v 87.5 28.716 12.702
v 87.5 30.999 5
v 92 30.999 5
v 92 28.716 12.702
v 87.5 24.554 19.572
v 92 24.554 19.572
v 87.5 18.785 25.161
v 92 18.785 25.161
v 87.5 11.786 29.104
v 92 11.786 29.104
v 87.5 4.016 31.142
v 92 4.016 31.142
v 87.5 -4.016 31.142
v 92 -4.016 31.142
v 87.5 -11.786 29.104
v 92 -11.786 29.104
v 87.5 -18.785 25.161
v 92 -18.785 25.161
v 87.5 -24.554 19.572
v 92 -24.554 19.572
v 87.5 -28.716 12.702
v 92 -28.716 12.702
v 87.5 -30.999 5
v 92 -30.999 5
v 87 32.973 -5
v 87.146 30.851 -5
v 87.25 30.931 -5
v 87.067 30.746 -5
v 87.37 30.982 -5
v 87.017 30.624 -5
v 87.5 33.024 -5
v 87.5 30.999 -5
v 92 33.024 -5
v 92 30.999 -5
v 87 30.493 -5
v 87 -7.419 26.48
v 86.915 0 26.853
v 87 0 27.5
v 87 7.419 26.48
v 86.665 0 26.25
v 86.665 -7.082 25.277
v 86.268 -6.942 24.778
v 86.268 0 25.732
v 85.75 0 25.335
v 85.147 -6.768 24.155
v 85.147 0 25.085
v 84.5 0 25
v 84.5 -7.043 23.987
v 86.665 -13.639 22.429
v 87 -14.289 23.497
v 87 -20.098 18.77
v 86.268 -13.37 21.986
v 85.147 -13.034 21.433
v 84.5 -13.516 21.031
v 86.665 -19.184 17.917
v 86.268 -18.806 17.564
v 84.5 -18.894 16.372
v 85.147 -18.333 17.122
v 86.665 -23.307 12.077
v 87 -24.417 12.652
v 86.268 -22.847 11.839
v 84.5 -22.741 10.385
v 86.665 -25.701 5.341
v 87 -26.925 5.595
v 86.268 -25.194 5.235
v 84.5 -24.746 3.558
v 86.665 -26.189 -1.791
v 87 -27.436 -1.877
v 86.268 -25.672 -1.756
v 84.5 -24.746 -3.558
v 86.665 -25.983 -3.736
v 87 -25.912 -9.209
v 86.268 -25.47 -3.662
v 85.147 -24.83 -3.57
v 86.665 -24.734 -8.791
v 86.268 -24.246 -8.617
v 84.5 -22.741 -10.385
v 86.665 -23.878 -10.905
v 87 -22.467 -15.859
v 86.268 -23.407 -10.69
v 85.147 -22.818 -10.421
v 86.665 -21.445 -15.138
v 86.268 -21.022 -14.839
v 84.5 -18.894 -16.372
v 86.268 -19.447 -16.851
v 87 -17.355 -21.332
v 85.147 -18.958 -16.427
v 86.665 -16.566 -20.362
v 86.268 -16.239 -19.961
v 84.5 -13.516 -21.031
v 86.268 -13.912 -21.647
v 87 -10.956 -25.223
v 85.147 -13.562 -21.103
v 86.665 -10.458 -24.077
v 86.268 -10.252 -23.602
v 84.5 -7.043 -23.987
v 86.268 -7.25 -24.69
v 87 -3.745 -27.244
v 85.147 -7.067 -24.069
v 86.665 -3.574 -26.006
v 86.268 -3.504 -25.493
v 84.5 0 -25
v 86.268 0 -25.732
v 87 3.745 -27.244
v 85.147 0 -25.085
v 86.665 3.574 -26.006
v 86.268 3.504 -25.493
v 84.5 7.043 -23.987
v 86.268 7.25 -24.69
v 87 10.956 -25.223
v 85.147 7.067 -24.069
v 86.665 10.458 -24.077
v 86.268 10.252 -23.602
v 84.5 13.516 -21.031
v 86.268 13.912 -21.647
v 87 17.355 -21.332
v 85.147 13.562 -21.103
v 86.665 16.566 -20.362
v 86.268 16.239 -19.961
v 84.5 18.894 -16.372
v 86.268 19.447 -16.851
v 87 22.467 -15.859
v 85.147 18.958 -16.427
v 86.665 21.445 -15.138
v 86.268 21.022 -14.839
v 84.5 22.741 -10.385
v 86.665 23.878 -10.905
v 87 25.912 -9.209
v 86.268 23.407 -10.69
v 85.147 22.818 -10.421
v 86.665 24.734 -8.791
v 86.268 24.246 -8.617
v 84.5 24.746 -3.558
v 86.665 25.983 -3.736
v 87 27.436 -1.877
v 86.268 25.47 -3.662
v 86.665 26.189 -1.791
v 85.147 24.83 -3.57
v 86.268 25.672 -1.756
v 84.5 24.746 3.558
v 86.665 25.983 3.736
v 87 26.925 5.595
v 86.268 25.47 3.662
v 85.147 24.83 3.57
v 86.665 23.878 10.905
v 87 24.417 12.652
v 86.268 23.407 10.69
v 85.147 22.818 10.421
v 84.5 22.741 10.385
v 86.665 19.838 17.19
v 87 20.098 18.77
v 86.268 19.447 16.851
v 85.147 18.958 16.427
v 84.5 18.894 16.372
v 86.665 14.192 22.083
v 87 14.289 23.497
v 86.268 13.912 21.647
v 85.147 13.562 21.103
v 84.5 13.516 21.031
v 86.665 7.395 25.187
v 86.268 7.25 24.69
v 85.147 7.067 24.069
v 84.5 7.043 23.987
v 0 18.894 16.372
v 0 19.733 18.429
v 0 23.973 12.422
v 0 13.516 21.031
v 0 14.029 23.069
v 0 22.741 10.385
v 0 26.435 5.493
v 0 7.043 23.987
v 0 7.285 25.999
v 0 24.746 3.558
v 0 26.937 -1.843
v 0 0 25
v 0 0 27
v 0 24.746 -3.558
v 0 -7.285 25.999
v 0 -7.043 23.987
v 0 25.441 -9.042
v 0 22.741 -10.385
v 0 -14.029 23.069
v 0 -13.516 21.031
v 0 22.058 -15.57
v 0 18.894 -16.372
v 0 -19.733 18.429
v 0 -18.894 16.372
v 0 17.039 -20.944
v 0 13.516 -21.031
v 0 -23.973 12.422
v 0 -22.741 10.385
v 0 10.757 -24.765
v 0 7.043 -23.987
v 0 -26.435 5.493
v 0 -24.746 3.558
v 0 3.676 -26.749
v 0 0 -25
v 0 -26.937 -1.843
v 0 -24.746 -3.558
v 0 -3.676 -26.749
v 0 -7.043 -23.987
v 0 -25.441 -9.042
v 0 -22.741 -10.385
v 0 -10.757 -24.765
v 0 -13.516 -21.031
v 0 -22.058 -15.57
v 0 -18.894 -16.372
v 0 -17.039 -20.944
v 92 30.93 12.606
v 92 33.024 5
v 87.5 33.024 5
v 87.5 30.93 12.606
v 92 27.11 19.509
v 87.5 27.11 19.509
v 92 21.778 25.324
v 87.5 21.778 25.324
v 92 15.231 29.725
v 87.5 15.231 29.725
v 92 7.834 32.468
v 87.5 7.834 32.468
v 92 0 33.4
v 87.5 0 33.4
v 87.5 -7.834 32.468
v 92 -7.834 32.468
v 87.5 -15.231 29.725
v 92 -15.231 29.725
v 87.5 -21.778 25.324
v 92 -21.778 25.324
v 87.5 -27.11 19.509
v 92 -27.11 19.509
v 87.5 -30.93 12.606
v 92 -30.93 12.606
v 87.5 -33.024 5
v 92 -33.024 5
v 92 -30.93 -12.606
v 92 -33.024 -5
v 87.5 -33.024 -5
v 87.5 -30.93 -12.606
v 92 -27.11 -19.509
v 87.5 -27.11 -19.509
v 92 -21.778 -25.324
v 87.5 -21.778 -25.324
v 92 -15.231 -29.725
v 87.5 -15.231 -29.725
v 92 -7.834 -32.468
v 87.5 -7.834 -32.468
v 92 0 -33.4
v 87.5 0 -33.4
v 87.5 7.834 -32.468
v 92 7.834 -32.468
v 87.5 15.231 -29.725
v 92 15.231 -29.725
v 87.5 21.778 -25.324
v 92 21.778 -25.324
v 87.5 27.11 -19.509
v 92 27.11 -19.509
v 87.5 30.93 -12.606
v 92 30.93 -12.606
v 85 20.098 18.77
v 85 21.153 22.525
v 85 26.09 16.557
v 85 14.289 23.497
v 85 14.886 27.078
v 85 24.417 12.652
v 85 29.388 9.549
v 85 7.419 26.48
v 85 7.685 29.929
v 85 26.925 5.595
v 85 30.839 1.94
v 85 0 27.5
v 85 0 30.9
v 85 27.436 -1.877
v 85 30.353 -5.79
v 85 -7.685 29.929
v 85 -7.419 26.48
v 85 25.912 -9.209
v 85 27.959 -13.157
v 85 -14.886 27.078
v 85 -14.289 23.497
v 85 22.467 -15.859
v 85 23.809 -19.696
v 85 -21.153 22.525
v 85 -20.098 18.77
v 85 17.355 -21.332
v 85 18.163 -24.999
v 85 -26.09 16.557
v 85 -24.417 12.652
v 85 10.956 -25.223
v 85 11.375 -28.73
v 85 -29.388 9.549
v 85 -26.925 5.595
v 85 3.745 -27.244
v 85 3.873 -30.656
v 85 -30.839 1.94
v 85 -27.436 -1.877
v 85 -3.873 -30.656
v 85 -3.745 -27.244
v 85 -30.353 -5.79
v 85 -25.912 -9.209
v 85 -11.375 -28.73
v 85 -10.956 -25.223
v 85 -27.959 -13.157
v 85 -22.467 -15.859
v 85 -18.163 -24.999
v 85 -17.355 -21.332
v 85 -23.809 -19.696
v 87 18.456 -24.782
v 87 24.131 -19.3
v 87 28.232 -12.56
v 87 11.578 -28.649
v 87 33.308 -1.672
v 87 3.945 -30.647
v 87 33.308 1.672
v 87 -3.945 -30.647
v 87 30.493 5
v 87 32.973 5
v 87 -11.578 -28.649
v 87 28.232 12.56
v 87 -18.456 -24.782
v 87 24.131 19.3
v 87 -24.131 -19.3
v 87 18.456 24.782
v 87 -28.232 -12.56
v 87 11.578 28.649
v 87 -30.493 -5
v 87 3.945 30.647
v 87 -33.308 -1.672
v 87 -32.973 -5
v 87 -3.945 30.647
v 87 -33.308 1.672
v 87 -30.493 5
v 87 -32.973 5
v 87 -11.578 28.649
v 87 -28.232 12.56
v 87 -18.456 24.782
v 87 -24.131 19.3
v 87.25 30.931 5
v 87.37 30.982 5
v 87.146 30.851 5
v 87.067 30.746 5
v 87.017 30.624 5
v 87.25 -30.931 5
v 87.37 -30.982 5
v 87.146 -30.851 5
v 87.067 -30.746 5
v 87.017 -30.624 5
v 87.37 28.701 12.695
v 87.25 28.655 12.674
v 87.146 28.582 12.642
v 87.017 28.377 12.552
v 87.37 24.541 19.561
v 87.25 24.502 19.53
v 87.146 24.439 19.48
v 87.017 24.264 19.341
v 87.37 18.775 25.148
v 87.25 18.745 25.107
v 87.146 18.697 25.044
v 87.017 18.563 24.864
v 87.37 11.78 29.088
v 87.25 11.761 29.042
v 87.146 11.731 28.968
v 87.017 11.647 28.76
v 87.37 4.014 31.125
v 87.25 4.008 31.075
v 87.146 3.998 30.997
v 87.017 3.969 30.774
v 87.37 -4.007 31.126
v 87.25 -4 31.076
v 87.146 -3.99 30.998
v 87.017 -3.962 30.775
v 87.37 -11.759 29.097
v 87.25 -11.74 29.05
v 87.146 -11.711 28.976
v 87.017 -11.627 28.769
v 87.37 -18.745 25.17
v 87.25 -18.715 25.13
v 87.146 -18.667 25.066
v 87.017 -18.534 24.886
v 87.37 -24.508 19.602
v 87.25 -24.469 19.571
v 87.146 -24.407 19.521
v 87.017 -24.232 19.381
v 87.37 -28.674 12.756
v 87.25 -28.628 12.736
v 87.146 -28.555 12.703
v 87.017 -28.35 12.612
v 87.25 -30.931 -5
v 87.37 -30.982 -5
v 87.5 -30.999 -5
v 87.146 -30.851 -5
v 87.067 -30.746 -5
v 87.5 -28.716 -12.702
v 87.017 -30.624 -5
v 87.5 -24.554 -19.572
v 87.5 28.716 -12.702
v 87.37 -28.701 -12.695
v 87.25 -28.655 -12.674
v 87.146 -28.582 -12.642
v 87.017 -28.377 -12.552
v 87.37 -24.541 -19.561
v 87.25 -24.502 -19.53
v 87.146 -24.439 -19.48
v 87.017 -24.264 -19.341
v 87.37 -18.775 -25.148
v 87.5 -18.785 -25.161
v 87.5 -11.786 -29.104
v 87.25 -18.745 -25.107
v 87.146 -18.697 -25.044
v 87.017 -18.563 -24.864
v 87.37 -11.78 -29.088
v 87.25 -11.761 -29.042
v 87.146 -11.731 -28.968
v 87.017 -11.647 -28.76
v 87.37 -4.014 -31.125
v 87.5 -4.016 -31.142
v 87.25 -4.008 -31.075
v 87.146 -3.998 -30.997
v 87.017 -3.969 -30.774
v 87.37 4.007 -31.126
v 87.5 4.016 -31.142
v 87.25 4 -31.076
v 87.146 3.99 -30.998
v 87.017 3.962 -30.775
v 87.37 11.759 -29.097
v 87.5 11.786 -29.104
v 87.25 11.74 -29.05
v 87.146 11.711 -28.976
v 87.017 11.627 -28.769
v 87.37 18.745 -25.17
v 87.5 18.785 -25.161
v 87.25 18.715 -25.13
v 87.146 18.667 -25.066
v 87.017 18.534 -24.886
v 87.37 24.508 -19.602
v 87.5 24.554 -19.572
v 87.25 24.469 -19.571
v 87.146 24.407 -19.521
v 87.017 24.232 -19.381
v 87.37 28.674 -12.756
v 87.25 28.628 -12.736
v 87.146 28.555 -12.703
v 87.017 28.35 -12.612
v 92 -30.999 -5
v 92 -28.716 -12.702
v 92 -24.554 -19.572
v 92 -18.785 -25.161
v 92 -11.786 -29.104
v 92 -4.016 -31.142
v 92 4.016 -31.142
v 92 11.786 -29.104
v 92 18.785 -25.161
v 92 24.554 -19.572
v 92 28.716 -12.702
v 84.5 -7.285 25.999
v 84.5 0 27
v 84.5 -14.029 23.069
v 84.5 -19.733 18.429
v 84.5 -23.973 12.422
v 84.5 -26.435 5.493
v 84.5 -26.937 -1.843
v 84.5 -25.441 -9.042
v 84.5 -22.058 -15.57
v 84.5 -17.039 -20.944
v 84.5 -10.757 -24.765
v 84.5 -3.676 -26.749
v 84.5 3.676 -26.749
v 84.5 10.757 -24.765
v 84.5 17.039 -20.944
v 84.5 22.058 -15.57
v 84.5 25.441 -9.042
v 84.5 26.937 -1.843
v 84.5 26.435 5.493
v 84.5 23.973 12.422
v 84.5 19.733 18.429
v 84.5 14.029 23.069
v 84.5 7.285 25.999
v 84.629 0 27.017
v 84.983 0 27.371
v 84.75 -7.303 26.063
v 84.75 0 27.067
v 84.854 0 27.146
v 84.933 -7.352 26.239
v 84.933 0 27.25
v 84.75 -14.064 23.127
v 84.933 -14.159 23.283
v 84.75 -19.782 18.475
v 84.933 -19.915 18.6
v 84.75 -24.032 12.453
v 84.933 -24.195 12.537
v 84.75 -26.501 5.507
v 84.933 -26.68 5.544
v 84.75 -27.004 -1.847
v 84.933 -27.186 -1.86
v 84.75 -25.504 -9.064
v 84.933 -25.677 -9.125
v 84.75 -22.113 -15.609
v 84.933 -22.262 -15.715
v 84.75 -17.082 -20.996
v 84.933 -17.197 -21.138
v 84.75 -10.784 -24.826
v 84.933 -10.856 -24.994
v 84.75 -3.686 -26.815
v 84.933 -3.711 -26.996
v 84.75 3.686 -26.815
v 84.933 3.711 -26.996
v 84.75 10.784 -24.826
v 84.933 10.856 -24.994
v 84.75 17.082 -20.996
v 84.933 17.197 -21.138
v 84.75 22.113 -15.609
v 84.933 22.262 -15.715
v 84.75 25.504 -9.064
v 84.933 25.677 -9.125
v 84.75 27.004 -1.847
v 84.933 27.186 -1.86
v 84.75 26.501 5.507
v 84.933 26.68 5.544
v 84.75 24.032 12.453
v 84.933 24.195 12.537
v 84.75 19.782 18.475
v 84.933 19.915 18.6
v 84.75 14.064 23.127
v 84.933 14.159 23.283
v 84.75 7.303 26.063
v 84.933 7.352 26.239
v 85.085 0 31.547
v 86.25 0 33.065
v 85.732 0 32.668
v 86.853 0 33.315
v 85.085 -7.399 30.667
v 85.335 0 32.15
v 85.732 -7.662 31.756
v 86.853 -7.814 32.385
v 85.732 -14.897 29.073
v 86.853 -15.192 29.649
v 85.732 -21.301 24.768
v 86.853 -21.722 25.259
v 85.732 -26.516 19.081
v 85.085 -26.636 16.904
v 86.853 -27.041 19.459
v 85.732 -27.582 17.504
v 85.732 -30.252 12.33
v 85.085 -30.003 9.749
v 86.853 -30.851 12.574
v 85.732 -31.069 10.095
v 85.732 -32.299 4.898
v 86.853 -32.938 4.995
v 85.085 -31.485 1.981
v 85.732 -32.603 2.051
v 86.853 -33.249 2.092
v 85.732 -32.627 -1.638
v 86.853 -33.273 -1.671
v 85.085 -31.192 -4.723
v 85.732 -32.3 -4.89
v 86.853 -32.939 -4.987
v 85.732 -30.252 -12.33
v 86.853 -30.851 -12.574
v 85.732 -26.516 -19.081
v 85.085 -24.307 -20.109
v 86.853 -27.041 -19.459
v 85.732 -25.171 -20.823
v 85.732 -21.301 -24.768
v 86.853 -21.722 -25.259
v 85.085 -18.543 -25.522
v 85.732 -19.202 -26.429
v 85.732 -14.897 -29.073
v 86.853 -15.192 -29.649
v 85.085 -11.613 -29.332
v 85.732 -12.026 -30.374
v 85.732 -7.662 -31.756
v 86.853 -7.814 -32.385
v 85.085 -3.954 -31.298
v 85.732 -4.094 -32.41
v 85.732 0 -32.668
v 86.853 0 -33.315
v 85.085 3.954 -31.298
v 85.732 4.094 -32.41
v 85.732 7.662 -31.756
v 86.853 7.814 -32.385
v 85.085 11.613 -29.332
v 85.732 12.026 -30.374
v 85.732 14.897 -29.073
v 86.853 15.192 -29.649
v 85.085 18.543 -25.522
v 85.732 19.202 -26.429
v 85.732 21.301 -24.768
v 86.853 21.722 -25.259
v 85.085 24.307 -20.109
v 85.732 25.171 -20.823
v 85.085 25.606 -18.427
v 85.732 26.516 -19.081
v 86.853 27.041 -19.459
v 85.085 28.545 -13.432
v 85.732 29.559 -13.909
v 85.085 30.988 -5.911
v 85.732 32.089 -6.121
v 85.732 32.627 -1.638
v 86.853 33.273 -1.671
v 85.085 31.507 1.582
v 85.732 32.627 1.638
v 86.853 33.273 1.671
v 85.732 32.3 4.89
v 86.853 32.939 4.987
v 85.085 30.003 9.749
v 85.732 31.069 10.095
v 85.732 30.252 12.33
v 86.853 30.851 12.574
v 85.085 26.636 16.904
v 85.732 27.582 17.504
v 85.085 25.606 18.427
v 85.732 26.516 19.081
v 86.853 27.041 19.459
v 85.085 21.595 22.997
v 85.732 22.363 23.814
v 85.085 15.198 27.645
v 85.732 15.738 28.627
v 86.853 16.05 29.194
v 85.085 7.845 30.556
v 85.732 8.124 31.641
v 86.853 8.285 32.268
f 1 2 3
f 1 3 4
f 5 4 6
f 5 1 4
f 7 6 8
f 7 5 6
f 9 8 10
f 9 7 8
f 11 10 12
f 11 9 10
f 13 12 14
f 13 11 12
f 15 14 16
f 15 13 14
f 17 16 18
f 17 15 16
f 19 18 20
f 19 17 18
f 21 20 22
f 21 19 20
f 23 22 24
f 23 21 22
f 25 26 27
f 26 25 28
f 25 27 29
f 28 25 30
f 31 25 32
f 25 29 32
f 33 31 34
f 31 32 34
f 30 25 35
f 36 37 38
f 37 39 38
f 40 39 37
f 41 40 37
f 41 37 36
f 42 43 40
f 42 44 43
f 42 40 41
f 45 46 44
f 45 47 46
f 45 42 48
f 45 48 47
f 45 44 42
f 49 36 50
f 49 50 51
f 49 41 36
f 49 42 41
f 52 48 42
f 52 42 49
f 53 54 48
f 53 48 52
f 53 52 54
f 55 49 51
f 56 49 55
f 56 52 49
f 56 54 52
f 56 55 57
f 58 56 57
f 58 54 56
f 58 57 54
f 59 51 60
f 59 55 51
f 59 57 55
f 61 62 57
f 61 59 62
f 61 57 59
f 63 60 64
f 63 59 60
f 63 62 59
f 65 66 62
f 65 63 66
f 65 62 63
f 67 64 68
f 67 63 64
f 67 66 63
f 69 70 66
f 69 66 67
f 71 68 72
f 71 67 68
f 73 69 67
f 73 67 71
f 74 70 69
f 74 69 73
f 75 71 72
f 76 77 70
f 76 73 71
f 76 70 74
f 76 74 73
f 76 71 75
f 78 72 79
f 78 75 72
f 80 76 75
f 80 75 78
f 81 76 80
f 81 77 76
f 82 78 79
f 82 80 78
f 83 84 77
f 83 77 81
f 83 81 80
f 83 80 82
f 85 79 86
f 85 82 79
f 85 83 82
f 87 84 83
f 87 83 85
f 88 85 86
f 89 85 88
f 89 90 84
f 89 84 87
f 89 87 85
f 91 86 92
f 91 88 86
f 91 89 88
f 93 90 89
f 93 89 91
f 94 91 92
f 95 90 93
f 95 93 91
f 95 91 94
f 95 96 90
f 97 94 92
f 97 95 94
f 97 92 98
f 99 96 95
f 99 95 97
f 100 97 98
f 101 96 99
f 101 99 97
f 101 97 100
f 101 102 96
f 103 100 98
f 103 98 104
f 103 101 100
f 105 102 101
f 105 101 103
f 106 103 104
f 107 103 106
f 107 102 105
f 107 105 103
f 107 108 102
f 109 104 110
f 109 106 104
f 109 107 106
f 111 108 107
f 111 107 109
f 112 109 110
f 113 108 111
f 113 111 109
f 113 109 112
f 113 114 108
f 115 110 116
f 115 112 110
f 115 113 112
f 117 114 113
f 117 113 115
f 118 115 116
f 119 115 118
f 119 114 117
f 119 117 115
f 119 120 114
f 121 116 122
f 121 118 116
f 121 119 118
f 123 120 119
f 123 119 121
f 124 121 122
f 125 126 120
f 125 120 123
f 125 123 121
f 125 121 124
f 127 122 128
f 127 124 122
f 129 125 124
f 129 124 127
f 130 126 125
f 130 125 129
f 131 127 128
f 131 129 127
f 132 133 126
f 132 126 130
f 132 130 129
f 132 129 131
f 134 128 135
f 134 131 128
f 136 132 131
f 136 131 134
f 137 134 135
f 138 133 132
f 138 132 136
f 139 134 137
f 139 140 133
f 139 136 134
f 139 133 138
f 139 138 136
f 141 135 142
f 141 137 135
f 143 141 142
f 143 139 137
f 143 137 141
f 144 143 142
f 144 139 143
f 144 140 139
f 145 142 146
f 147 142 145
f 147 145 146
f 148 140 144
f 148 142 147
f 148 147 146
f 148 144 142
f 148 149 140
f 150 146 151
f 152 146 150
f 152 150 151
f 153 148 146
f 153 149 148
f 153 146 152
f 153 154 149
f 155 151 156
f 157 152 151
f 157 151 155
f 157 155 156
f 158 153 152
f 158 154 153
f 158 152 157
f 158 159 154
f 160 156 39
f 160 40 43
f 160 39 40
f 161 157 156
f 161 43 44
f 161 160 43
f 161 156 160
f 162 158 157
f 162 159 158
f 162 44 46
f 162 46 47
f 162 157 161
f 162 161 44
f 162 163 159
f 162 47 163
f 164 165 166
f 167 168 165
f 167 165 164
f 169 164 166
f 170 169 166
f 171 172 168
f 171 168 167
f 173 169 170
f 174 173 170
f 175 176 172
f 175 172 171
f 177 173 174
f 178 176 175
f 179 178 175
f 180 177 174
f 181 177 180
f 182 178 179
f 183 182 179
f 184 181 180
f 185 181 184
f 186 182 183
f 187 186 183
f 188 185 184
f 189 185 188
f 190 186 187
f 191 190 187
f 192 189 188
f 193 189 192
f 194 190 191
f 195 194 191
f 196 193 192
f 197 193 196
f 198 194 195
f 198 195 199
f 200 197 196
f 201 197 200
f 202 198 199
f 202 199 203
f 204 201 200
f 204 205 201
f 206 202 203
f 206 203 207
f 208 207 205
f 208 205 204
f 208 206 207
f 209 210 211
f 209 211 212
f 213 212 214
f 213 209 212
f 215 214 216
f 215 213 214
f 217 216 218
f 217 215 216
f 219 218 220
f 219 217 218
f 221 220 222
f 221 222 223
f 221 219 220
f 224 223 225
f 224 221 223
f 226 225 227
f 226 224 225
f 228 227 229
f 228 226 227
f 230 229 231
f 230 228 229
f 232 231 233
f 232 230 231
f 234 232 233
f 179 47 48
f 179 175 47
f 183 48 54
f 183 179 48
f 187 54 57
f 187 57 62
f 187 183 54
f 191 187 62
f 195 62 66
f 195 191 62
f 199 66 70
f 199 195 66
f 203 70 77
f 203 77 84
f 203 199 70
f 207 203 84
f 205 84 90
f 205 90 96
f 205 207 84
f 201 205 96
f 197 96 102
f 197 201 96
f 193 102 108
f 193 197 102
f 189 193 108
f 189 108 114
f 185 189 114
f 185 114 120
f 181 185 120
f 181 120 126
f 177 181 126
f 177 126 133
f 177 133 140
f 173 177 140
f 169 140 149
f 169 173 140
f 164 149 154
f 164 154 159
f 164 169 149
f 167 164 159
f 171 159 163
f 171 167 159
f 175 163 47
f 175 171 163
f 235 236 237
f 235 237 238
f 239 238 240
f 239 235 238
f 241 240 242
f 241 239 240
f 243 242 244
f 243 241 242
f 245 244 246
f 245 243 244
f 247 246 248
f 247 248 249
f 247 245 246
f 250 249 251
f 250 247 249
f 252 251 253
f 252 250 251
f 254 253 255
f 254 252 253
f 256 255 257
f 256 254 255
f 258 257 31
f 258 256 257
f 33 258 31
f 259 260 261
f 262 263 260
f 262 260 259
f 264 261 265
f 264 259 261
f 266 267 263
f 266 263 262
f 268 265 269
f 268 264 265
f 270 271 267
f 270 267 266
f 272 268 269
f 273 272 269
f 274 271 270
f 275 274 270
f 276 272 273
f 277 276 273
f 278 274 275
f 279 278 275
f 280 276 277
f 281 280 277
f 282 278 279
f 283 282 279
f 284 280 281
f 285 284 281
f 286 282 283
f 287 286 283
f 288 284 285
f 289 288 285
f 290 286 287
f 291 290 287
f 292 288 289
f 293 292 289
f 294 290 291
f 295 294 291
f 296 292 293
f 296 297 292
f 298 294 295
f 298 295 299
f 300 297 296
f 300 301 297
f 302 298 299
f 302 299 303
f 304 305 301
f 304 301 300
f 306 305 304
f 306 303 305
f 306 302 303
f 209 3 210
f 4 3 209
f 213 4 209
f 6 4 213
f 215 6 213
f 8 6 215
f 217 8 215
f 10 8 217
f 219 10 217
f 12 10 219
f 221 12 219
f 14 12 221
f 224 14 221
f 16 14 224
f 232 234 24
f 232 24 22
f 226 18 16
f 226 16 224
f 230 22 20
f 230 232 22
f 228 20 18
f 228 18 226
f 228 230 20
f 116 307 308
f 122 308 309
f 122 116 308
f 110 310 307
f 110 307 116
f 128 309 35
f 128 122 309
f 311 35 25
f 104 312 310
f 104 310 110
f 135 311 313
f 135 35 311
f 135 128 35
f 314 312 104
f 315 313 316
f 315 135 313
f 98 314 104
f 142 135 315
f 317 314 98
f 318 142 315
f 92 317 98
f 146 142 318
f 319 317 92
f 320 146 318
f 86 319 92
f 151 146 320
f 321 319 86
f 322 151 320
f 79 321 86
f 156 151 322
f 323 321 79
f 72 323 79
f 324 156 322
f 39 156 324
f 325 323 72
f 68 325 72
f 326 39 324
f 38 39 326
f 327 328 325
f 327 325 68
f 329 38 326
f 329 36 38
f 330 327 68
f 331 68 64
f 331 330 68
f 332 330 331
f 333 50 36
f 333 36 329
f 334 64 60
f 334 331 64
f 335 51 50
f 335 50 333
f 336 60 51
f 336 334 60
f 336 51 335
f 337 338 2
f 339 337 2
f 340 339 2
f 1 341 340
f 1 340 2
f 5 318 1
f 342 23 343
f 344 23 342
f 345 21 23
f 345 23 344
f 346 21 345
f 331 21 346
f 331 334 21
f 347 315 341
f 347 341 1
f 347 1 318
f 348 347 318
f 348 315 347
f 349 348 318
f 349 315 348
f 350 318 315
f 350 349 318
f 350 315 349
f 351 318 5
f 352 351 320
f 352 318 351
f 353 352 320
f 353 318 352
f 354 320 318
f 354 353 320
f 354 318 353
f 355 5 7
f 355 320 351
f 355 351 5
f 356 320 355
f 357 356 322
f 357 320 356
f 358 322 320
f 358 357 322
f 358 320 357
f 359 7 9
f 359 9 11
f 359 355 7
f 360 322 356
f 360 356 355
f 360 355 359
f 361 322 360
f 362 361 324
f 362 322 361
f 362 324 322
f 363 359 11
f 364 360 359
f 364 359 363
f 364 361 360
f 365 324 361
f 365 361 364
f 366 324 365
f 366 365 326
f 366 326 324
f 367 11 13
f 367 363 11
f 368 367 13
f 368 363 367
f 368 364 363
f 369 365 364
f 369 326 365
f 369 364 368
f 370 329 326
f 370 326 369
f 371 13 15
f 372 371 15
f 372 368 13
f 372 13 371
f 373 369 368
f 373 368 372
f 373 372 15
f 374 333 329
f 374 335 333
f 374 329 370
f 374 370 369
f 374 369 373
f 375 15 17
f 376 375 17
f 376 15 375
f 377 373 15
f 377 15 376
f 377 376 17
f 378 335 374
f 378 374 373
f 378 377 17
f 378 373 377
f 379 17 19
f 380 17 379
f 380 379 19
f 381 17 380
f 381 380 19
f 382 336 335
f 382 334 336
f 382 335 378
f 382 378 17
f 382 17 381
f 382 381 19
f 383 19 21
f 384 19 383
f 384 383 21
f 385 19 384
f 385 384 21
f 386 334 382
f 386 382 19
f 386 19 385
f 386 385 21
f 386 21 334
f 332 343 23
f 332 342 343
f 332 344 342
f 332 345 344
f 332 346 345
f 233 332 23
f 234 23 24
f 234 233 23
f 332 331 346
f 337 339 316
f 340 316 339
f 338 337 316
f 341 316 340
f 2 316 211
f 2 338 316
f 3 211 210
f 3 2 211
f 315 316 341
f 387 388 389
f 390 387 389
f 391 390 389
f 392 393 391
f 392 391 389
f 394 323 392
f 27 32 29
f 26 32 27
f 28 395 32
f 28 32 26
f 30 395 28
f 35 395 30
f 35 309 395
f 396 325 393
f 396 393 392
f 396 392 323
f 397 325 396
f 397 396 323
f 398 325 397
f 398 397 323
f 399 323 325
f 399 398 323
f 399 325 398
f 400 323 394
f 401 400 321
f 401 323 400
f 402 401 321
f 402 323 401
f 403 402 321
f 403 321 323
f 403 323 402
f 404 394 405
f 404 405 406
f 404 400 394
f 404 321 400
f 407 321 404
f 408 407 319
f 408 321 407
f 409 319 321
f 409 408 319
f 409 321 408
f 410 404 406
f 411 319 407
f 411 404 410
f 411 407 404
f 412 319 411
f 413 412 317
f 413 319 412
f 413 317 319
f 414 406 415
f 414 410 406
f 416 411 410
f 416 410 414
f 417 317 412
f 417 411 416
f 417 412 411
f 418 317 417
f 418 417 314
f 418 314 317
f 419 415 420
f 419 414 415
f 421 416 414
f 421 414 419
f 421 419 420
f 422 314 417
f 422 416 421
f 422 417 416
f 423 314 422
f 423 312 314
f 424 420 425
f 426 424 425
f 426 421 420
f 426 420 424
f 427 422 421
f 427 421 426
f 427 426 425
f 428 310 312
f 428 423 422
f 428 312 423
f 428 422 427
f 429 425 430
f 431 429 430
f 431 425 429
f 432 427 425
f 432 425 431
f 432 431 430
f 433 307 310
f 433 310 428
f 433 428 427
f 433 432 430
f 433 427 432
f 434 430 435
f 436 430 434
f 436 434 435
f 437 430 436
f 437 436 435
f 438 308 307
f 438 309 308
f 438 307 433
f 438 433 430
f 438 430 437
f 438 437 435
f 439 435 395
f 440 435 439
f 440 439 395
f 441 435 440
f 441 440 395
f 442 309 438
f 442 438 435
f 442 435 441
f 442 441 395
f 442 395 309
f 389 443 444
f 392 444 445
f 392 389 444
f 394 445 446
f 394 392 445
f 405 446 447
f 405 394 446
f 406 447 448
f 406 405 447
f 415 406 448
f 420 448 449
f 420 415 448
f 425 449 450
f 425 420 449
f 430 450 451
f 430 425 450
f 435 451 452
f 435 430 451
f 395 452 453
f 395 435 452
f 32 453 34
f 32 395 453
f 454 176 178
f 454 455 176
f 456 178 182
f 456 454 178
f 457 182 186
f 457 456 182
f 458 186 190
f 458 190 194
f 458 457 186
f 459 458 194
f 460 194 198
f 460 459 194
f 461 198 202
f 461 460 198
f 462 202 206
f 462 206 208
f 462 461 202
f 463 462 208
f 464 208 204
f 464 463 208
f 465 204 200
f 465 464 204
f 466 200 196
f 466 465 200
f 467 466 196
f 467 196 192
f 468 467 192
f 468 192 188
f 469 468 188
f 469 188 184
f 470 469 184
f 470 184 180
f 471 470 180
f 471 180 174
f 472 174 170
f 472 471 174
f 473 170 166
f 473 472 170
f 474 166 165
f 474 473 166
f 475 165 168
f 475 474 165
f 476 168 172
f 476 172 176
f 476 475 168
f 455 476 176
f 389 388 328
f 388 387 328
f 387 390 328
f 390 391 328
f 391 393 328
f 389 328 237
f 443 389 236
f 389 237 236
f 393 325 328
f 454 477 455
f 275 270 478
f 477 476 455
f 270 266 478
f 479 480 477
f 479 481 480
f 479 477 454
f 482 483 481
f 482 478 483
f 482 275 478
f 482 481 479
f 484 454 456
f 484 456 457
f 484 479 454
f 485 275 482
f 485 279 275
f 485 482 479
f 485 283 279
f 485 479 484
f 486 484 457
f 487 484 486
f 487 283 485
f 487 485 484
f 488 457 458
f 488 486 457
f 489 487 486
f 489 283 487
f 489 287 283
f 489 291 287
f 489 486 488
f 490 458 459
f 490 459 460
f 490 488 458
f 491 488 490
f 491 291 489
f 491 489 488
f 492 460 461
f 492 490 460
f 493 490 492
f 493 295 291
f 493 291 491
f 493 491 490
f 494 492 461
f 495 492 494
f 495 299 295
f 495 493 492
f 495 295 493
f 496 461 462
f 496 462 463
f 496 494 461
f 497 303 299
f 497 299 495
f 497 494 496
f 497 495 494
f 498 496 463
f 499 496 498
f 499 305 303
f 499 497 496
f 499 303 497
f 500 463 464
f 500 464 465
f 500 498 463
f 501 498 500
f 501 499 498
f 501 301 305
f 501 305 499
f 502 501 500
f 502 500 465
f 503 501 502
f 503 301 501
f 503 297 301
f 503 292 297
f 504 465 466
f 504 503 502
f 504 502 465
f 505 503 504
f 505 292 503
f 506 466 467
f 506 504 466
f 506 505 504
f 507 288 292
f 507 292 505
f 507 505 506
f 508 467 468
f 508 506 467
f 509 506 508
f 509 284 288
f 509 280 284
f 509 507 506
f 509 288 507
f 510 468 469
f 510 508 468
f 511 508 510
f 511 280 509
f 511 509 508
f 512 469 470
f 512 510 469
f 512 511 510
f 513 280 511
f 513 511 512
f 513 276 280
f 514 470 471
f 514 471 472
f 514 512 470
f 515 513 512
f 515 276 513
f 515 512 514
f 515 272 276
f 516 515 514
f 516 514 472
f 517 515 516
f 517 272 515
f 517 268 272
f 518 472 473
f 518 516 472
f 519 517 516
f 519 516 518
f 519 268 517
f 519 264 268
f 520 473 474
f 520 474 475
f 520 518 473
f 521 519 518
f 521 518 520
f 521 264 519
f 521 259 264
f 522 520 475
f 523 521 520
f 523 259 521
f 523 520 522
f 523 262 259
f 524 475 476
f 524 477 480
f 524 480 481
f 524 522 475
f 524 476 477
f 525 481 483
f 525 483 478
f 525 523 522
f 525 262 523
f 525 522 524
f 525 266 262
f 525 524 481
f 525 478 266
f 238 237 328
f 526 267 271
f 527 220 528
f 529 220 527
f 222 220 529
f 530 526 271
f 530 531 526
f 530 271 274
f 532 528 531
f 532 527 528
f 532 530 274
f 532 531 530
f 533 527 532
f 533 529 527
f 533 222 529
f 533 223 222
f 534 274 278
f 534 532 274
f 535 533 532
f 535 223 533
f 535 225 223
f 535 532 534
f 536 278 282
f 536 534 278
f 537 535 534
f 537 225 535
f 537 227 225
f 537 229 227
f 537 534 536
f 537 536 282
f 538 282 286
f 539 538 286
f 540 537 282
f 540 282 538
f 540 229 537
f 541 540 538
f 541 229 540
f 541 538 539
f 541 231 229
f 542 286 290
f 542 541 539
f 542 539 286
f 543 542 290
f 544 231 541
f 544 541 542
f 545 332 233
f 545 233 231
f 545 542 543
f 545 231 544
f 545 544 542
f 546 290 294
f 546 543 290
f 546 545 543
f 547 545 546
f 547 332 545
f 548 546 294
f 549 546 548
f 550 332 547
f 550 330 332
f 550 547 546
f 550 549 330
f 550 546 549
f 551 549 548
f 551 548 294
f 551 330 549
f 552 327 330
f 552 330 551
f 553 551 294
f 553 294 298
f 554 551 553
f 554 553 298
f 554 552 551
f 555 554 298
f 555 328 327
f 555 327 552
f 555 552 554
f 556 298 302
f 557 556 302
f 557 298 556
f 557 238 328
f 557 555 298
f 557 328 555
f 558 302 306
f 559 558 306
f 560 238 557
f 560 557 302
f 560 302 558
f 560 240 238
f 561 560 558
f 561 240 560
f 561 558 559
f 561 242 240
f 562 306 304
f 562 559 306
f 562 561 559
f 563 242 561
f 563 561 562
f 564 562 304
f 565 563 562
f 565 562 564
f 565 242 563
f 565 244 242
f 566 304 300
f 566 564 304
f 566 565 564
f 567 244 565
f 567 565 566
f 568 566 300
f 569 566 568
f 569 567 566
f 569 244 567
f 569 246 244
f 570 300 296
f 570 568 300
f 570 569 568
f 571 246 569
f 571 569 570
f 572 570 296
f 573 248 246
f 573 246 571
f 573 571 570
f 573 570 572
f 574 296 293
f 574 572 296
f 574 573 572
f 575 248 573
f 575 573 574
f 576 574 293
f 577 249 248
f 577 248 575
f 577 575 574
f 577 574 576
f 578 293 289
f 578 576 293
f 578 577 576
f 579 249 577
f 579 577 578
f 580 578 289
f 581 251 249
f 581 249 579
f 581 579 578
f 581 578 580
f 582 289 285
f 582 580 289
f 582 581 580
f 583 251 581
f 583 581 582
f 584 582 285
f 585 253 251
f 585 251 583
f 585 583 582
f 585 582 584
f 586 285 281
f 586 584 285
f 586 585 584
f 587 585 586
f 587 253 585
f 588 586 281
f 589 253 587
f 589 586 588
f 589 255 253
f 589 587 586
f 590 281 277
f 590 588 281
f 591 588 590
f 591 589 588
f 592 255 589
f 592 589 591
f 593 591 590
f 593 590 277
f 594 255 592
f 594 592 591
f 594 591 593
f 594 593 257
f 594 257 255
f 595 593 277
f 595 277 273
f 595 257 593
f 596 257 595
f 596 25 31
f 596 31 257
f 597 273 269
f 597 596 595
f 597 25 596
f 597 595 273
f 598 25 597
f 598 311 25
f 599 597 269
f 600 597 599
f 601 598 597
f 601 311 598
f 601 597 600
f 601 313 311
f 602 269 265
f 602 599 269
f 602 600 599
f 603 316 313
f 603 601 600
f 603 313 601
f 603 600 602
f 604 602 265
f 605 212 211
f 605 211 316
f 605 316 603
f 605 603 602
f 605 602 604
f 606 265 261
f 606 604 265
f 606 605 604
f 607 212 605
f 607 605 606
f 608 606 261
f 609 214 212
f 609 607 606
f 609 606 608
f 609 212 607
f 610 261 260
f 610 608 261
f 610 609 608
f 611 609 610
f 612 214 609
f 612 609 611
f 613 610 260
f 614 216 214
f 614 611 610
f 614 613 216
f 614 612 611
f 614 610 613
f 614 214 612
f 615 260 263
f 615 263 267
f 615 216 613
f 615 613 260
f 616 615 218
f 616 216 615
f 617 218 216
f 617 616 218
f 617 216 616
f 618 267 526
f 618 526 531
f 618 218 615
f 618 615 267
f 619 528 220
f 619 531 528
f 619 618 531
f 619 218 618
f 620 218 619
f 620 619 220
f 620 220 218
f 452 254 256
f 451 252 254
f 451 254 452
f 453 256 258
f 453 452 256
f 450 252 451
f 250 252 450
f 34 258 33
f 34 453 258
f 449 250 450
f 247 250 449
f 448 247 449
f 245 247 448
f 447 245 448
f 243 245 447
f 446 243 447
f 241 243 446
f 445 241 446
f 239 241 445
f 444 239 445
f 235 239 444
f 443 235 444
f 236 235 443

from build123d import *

# Parameters (mm, degrees)
ENL_V_MAT_EXTRU_1_DEPTH      = 104.417213267
ENL_V_MAT_EXTRU_1_DEPTH_BACK = 104.417213267
ESQUISSE2_W                  = 5
ESQUISSE2_H                  = 10


with BuildPart() as part:
    # Esquisse1 → Base-Révol.-Mince (revolve)
    with BuildSketch(Plane.XY, mode=Mode.PRIVATE) as base_r_vol_mince_sk:
        with BuildLine():
            Line((0, 27), (84.5, 27))
            ThreePointArc((84.5, 27), (84.853553391, 27.146446609), (85, 27.5))
            Line((85, 27.5), (85, 30.9))
            ThreePointArc((85, 30.9), (85.732233047, 32.667766953), (87.5, 33.4))
            Line((87.5, 33.4), (92, 33.4))
            Line((92, 33.4), (92, 31.4))
            Line((92, 31.4), (87.5, 31.4))
            ThreePointArc((87.5, 31.4), (87.146446609, 31.253553391), (87, 30.9))
            Line((87, 30.9), (87, 27.5))
            ThreePointArc((87, 27.5), (86.267766953, 25.732233047), (84.5, 25))
            Line((84.5, 25), (0, 25))
            Line((0, 25), (0, 27))
        make_face()
    revolve(base_r_vol_mince_sk.sketch.rotate(Axis((0, 0, 0), (1, 0, 0)), 90), axis=Axis((0, 0, 0), (1, 0, 0)))

    # Esquisse2 → Enlèv. mat.-Extru.1 (cut, two sides: drawn at the far end of the back side and taken through both)
    with BuildSketch(Plane(origin=(0, 0, 0), x_dir=(1, 0, 0), z_dir=(0, 1, 0)).offset(-ENL_V_MAT_EXTRU_1_DEPTH_BACK)):
        with Locations((89.5, 0)):
            Rectangle(ESQUISSE2_W, ESQUISSE2_H)
    extrude(amount=ENL_V_MAT_EXTRU_1_DEPTH + ENL_V_MAT_EXTRU_1_DEPTH_BACK, mode=Mode.SUBTRACT)


solid = part.part
